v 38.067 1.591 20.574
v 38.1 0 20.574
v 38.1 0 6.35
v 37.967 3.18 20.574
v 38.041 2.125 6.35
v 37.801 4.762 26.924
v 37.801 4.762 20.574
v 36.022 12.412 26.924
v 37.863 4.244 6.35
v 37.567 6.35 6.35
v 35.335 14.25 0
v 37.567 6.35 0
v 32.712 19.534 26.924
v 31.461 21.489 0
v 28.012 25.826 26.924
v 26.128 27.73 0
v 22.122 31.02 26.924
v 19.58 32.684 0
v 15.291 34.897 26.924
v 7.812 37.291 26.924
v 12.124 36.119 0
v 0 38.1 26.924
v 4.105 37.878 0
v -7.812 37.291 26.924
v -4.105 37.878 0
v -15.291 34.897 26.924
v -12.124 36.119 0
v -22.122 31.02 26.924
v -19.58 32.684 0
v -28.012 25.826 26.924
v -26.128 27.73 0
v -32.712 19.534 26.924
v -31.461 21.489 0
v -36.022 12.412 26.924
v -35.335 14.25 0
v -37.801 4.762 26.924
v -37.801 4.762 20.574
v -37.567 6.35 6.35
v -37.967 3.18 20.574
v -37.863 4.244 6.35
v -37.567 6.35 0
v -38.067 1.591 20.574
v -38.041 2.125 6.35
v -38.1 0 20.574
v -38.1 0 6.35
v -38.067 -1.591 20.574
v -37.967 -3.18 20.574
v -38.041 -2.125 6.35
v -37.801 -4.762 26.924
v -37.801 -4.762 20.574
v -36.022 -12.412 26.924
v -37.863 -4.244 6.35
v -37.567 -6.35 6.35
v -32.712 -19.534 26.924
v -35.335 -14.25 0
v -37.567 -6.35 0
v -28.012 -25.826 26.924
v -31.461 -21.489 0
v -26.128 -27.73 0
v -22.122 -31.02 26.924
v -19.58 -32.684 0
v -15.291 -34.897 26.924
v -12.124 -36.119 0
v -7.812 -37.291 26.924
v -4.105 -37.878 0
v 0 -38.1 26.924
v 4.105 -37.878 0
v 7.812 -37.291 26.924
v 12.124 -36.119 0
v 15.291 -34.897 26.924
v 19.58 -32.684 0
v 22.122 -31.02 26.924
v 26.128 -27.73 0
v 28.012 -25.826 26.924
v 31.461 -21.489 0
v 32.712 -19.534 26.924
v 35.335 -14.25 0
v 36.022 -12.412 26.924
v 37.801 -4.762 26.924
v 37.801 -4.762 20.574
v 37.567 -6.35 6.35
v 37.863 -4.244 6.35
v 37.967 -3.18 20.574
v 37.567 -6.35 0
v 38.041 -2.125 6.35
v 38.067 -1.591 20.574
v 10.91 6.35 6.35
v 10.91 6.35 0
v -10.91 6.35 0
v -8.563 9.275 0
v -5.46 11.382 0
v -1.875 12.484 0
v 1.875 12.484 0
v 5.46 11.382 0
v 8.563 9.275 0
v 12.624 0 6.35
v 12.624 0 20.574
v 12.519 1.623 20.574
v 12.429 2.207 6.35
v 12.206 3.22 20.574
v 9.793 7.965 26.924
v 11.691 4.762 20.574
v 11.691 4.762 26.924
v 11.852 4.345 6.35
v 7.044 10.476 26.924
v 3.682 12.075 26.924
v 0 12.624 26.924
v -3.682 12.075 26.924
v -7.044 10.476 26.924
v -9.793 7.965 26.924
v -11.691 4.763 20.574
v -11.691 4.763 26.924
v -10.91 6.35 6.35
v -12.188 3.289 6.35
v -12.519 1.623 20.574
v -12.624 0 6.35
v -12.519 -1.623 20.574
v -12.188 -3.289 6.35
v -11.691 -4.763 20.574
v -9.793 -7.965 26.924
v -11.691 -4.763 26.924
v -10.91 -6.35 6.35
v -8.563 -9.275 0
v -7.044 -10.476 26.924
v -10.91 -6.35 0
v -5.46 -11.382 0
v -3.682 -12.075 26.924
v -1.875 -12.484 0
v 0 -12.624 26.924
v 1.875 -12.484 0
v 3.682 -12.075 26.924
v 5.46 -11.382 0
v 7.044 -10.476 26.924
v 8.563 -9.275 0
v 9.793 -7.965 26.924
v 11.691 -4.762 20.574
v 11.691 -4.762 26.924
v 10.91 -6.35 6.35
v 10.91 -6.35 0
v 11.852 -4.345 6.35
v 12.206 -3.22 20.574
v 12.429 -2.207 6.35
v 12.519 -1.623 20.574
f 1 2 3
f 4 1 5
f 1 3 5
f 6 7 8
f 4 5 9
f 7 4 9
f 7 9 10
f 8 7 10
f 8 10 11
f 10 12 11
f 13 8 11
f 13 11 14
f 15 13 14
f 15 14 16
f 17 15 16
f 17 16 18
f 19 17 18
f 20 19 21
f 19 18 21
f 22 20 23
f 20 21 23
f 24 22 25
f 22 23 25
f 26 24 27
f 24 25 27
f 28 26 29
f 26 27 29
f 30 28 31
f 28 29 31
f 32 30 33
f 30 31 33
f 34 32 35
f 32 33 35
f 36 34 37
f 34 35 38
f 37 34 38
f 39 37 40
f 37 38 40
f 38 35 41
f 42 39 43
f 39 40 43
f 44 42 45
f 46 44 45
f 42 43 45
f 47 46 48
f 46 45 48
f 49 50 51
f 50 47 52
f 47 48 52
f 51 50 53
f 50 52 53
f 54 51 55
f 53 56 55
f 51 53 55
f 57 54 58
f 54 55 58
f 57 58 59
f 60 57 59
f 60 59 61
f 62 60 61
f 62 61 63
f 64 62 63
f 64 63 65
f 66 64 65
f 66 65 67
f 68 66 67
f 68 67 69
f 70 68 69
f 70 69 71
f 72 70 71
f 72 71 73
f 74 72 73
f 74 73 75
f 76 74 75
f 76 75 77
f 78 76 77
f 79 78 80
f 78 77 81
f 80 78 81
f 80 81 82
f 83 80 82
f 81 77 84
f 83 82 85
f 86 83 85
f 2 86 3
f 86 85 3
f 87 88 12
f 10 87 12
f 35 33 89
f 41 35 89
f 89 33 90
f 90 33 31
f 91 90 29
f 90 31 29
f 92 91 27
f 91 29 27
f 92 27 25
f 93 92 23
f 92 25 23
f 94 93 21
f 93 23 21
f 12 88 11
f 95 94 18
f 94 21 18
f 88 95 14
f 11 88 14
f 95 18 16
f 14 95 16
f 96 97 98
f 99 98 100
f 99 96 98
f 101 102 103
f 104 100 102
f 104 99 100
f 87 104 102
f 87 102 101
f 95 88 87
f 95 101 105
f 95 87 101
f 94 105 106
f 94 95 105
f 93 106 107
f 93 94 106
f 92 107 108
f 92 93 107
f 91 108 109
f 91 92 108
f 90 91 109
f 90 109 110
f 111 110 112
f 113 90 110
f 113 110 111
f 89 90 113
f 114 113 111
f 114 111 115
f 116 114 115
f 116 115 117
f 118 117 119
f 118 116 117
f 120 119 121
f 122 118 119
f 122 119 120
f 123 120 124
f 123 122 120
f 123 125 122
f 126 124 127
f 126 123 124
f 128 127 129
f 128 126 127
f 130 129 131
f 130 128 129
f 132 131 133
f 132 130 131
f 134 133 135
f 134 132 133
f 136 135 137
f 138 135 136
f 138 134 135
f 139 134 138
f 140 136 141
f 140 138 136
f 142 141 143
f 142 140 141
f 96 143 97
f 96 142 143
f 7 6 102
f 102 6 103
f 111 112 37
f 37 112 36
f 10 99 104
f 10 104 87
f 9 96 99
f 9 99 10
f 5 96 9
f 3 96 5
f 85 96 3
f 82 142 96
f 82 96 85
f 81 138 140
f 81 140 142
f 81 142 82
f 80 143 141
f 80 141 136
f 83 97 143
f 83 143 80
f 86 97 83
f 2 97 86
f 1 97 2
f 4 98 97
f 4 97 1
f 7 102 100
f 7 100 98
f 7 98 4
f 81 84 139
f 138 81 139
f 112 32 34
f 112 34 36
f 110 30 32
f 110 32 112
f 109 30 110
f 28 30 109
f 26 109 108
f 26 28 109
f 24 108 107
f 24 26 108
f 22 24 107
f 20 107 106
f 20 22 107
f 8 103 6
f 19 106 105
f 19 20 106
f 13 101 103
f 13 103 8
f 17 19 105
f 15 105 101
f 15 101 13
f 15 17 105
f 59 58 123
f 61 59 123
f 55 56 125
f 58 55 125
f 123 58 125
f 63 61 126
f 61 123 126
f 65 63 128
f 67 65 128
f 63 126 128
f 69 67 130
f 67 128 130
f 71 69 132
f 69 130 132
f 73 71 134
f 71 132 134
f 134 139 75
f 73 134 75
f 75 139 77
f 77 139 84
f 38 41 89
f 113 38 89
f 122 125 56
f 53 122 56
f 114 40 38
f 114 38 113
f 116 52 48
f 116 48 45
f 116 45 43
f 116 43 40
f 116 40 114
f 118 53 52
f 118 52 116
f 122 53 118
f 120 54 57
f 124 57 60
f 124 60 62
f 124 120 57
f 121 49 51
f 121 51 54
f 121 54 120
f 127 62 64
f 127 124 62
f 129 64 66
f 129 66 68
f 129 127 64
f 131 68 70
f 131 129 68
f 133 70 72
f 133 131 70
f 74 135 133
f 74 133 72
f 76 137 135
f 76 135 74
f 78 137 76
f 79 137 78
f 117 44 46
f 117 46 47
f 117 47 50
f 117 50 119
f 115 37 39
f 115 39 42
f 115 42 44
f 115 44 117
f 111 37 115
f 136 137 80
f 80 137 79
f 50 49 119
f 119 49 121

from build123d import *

# Parameters (mm, degrees)
F0_R     = 38.1
F0_R_2   = 12.6238
F1_DEPTH = 26.924
F3_DEPTH = 6.35
F5_DEPTH = 6.35


with BuildPart() as f1:
    # F0 (on Top) → F1 (new body)
    with BuildSketch(Plane.XY):
        Circle(F0_R)
        Circle(F0_R_2, mode=Mode.SUBTRACT)
    extrude(amount=F1_DEPTH)

    # F2 (on face) → F3 (cut)
    with BuildSketch(Plane.XY.offset(26.924)):
        with BuildLine():
            Line((-11.6909760153, 4.7625), (-37.8011718568, 4.7625))
            ThreePointArc((-37.8011718568, 4.7625), (-38.0252195769, 2.3859329679), (-38.1, 0))
            ThreePointArc((-38.1, 0), (-38.0252195769, -2.3859329679), (-37.8011718568, -4.7625))
            Line((-37.8011718568, -4.7625), (-11.6909760153, -4.7625))
            ThreePointArc((-11.6909760153, -4.7625), (-12.6238, 0), (-11.6909760153, 4.7625))
        make_face()
        with BuildLine():
            ThreePointArc((38.1, 0), (38.0252195769, 2.3859329679), (37.8011718568, 4.7625))
            Line((37.8011718568, 4.7625), (11.6909760153, 4.7625))
            ThreePointArc((11.6909760153, 4.7625), (12.3883991997, 2.426497828), (12.6238, 0))
            ThreePointArc((12.6238, 0), (12.3883991997, -2.426497828), (11.6909760153, -4.7625))
            Line((11.6909760153, -4.7625), (37.8011718568, -4.7625))
            ThreePointArc((37.8011718568, -4.7625), (38.0252195769, -2.3859329679), (38.1, 0))
        make_face()
    extrude(amount=-F3_DEPTH, mode=Mode.SUBTRACT)

    # F4 (on face) → F5 (cut)
    with BuildSketch(Plane(origin=(0, 0, 0), x_dir=(1, 0, 0), z_dir=(0, 0, -1))):
        with BuildLine():
            Line((-10.9104457489, 6.35), (-37.5671066227, 6.35))
            ThreePointArc((-37.5671066227, 6.35), (-37.9665429182, 3.1861605167), (-38.1, 0))
            ThreePointArc((-38.1, 0), (-37.9665429182, -3.1861605167), (-37.5671066227, -6.35))
            Line((-37.5671066227, -6.35), (-10.9104457489, -6.35))
            ThreePointArc((-10.9104457489, -6.35), (-12.6238, 0), (-10.9104457489, 6.35))
        make_face()
        with BuildLine():
            ThreePointArc((38.1, 0), (37.9665429182, 3.1861605167), (37.5671066227, 6.35))
            Line((37.5671066227, 6.35), (10.9104457489, 6.35))
            ThreePointArc((10.9104457489, 6.35), (12.1879368944, 3.2885438567), (12.6238, 0))
            ThreePointArc((12.6238, 0), (12.1879368944, -3.2885438567), (10.9104457489, -6.35))
            Line((10.9104457489, -6.35), (37.5671066227, -6.35))
            ThreePointArc((37.5671066227, -6.35), (37.9665429182, -3.1861605167), (38.1, 0))
        make_face()
    extrude(amount=-F5_DEPTH, mode=Mode.SUBTRACT)


solid = f1.part
